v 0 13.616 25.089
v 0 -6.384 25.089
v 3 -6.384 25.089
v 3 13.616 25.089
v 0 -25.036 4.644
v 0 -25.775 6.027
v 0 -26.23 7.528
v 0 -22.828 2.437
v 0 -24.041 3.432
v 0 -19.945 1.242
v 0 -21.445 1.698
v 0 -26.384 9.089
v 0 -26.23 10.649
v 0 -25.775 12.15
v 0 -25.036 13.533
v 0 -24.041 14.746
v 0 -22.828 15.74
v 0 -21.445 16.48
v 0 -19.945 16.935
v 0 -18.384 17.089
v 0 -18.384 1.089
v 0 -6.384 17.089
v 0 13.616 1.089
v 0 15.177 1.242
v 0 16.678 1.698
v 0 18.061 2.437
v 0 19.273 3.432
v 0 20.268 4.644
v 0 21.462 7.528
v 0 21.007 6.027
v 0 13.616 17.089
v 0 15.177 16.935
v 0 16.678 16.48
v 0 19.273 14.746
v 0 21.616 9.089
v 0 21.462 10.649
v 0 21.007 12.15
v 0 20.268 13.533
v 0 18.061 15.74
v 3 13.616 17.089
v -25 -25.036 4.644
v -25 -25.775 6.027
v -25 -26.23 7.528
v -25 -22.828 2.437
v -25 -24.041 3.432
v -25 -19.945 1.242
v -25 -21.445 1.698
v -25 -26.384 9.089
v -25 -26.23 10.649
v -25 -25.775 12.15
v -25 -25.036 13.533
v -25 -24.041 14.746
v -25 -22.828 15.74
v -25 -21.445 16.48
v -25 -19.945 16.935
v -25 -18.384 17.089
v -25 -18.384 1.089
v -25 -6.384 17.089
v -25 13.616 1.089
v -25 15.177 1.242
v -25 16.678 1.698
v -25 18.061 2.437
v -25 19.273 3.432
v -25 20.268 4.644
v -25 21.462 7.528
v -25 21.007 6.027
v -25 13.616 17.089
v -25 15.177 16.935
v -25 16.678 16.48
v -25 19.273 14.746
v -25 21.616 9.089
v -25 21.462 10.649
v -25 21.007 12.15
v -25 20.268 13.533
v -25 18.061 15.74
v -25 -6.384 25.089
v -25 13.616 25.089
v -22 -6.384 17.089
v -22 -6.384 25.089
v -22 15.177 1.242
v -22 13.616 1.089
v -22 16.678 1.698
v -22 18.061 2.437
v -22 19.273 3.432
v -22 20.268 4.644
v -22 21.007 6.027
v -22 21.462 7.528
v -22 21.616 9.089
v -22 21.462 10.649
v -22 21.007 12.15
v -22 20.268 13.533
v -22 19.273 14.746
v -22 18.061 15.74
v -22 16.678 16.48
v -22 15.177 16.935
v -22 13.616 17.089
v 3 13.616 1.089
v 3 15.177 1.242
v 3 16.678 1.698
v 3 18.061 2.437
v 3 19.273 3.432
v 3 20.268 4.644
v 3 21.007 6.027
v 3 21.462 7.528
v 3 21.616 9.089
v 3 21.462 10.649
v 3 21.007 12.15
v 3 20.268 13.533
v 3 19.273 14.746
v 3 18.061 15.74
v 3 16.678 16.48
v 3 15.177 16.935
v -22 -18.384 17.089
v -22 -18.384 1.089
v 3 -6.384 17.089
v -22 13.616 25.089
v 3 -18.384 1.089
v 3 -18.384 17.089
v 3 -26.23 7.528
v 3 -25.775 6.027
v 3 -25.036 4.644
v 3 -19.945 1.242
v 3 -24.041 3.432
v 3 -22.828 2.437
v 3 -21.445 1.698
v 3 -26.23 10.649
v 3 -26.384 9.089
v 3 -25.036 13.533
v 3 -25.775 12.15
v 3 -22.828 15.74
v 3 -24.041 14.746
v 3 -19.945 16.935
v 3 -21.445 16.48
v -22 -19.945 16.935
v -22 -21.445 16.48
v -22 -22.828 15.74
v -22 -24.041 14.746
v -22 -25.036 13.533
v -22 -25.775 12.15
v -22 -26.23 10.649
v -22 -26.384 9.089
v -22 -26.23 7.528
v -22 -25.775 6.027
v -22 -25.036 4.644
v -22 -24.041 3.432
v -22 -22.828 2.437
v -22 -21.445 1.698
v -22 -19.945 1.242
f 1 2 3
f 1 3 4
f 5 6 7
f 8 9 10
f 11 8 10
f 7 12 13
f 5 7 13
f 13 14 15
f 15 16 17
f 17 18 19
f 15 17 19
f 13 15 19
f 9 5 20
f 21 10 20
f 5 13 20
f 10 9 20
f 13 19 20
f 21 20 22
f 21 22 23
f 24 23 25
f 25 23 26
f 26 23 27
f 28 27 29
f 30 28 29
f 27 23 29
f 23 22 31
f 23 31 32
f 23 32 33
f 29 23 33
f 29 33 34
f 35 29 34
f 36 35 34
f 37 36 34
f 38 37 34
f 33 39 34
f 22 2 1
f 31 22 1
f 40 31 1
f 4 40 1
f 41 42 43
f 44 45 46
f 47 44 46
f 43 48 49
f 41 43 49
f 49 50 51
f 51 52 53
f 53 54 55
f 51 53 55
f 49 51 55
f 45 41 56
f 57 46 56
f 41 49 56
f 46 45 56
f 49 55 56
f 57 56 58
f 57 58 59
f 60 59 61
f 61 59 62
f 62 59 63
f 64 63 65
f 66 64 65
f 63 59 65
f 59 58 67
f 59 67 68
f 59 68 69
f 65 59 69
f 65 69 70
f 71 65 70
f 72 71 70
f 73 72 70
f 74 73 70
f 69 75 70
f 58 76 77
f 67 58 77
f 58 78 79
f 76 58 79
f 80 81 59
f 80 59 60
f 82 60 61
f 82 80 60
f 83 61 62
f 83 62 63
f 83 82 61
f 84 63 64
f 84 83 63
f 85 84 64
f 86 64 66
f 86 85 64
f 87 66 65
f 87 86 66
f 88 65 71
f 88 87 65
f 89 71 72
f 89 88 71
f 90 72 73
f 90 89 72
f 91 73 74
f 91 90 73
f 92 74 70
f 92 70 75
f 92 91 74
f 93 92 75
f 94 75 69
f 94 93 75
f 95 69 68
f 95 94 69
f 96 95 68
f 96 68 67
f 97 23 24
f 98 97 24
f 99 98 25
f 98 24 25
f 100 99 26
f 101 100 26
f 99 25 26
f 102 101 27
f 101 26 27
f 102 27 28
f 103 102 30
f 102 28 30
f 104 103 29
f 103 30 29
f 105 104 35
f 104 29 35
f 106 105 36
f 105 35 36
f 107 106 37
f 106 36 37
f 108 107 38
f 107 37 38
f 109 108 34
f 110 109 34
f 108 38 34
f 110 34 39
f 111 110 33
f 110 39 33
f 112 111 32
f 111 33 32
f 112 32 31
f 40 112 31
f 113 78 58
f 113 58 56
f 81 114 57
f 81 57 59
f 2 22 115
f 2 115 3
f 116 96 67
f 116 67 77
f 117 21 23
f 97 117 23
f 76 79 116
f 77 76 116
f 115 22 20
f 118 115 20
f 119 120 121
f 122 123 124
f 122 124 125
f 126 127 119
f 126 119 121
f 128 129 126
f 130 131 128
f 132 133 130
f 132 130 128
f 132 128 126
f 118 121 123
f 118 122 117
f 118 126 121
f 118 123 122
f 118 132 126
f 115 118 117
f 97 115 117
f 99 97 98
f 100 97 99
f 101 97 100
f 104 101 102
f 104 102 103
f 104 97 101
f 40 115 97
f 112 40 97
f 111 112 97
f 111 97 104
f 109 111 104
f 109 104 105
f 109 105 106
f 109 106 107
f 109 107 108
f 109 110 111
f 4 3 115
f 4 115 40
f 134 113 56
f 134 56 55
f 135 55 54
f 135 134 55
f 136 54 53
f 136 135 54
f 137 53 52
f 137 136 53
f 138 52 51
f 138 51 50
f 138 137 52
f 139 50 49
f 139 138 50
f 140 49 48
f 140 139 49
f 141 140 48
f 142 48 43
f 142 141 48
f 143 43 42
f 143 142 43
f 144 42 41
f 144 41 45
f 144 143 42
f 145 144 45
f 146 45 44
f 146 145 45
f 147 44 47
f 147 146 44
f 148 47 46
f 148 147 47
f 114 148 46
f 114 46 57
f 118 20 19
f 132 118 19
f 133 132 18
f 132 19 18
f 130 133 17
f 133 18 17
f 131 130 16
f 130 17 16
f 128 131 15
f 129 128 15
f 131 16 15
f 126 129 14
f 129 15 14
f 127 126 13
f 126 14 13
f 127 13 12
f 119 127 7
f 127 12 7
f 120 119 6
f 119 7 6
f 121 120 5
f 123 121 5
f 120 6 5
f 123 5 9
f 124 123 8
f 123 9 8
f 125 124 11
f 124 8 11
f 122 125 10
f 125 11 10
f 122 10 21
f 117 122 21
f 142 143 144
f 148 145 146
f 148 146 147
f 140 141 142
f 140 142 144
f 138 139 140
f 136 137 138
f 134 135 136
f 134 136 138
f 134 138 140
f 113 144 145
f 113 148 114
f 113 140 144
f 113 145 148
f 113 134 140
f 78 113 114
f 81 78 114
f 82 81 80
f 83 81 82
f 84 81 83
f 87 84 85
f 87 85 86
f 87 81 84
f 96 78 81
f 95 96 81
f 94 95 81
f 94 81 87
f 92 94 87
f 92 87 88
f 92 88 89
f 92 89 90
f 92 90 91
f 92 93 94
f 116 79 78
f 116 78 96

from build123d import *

# Parameters (mm, degrees)
F0_R     = 3
F0_W     = 20
F0_H     = 8
F1_DEPTH = 3


# Not quite as in the source:
# - a feature names something its author has since deleted; it is built from what else it names


with BuildPart() as f1:
    # F0 (on Right) → F1 (new body)
    with BuildSketch(Plane.YZ):
        with BuildLine():
            ThreePointArc((-18.3839101195, 17.088659659), (-26.3839101195, 9.088659659), (-18.3839101195, 1.088659659))
            Line((-18.3839101195, 1.088659659), (13.6160898805, 1.088659659))
            ThreePointArc((13.6160898805, 1.088659659), (21.6160898805, 9.088659659), (13.6160898805, 17.088659659))
            Line((13.6160898805, 17.088659659), (-6.3839101195, 17.088659659))
            Line((-6.3839101195, 17.088659659), (-18.3839101195, 17.088659659))
        make_face()
        with Locations((-18.3839101195, 9.088659659)):
            Circle(F0_R, mode=Mode.SUBTRACT)
        with Locations((13.6160898805, 9.088659659)):
            Circle(F0_R, mode=Mode.SUBTRACT)
        with Locations((3.6160898805, 21.088659659)):
            Rectangle(F0_W, F0_H)
        with Locations((-18.3839101195, 9.088659659)):
            Circle(F0_R)
        with Locations((13.6160898805, 9.088659659)):
            Circle(F0_R)
    extrude(amount=F1_DEPTH)


with BuildPart() as f4_1:
    # F4: instance of F1
    add(f1.part.mirror(Plane(origin=(-11, 3.6160898805, 23.588659659), x_dir=(0, -1, 0), z_dir=(1, 0, 0))))


solid = Compound([f1.part, f4_1.part])
